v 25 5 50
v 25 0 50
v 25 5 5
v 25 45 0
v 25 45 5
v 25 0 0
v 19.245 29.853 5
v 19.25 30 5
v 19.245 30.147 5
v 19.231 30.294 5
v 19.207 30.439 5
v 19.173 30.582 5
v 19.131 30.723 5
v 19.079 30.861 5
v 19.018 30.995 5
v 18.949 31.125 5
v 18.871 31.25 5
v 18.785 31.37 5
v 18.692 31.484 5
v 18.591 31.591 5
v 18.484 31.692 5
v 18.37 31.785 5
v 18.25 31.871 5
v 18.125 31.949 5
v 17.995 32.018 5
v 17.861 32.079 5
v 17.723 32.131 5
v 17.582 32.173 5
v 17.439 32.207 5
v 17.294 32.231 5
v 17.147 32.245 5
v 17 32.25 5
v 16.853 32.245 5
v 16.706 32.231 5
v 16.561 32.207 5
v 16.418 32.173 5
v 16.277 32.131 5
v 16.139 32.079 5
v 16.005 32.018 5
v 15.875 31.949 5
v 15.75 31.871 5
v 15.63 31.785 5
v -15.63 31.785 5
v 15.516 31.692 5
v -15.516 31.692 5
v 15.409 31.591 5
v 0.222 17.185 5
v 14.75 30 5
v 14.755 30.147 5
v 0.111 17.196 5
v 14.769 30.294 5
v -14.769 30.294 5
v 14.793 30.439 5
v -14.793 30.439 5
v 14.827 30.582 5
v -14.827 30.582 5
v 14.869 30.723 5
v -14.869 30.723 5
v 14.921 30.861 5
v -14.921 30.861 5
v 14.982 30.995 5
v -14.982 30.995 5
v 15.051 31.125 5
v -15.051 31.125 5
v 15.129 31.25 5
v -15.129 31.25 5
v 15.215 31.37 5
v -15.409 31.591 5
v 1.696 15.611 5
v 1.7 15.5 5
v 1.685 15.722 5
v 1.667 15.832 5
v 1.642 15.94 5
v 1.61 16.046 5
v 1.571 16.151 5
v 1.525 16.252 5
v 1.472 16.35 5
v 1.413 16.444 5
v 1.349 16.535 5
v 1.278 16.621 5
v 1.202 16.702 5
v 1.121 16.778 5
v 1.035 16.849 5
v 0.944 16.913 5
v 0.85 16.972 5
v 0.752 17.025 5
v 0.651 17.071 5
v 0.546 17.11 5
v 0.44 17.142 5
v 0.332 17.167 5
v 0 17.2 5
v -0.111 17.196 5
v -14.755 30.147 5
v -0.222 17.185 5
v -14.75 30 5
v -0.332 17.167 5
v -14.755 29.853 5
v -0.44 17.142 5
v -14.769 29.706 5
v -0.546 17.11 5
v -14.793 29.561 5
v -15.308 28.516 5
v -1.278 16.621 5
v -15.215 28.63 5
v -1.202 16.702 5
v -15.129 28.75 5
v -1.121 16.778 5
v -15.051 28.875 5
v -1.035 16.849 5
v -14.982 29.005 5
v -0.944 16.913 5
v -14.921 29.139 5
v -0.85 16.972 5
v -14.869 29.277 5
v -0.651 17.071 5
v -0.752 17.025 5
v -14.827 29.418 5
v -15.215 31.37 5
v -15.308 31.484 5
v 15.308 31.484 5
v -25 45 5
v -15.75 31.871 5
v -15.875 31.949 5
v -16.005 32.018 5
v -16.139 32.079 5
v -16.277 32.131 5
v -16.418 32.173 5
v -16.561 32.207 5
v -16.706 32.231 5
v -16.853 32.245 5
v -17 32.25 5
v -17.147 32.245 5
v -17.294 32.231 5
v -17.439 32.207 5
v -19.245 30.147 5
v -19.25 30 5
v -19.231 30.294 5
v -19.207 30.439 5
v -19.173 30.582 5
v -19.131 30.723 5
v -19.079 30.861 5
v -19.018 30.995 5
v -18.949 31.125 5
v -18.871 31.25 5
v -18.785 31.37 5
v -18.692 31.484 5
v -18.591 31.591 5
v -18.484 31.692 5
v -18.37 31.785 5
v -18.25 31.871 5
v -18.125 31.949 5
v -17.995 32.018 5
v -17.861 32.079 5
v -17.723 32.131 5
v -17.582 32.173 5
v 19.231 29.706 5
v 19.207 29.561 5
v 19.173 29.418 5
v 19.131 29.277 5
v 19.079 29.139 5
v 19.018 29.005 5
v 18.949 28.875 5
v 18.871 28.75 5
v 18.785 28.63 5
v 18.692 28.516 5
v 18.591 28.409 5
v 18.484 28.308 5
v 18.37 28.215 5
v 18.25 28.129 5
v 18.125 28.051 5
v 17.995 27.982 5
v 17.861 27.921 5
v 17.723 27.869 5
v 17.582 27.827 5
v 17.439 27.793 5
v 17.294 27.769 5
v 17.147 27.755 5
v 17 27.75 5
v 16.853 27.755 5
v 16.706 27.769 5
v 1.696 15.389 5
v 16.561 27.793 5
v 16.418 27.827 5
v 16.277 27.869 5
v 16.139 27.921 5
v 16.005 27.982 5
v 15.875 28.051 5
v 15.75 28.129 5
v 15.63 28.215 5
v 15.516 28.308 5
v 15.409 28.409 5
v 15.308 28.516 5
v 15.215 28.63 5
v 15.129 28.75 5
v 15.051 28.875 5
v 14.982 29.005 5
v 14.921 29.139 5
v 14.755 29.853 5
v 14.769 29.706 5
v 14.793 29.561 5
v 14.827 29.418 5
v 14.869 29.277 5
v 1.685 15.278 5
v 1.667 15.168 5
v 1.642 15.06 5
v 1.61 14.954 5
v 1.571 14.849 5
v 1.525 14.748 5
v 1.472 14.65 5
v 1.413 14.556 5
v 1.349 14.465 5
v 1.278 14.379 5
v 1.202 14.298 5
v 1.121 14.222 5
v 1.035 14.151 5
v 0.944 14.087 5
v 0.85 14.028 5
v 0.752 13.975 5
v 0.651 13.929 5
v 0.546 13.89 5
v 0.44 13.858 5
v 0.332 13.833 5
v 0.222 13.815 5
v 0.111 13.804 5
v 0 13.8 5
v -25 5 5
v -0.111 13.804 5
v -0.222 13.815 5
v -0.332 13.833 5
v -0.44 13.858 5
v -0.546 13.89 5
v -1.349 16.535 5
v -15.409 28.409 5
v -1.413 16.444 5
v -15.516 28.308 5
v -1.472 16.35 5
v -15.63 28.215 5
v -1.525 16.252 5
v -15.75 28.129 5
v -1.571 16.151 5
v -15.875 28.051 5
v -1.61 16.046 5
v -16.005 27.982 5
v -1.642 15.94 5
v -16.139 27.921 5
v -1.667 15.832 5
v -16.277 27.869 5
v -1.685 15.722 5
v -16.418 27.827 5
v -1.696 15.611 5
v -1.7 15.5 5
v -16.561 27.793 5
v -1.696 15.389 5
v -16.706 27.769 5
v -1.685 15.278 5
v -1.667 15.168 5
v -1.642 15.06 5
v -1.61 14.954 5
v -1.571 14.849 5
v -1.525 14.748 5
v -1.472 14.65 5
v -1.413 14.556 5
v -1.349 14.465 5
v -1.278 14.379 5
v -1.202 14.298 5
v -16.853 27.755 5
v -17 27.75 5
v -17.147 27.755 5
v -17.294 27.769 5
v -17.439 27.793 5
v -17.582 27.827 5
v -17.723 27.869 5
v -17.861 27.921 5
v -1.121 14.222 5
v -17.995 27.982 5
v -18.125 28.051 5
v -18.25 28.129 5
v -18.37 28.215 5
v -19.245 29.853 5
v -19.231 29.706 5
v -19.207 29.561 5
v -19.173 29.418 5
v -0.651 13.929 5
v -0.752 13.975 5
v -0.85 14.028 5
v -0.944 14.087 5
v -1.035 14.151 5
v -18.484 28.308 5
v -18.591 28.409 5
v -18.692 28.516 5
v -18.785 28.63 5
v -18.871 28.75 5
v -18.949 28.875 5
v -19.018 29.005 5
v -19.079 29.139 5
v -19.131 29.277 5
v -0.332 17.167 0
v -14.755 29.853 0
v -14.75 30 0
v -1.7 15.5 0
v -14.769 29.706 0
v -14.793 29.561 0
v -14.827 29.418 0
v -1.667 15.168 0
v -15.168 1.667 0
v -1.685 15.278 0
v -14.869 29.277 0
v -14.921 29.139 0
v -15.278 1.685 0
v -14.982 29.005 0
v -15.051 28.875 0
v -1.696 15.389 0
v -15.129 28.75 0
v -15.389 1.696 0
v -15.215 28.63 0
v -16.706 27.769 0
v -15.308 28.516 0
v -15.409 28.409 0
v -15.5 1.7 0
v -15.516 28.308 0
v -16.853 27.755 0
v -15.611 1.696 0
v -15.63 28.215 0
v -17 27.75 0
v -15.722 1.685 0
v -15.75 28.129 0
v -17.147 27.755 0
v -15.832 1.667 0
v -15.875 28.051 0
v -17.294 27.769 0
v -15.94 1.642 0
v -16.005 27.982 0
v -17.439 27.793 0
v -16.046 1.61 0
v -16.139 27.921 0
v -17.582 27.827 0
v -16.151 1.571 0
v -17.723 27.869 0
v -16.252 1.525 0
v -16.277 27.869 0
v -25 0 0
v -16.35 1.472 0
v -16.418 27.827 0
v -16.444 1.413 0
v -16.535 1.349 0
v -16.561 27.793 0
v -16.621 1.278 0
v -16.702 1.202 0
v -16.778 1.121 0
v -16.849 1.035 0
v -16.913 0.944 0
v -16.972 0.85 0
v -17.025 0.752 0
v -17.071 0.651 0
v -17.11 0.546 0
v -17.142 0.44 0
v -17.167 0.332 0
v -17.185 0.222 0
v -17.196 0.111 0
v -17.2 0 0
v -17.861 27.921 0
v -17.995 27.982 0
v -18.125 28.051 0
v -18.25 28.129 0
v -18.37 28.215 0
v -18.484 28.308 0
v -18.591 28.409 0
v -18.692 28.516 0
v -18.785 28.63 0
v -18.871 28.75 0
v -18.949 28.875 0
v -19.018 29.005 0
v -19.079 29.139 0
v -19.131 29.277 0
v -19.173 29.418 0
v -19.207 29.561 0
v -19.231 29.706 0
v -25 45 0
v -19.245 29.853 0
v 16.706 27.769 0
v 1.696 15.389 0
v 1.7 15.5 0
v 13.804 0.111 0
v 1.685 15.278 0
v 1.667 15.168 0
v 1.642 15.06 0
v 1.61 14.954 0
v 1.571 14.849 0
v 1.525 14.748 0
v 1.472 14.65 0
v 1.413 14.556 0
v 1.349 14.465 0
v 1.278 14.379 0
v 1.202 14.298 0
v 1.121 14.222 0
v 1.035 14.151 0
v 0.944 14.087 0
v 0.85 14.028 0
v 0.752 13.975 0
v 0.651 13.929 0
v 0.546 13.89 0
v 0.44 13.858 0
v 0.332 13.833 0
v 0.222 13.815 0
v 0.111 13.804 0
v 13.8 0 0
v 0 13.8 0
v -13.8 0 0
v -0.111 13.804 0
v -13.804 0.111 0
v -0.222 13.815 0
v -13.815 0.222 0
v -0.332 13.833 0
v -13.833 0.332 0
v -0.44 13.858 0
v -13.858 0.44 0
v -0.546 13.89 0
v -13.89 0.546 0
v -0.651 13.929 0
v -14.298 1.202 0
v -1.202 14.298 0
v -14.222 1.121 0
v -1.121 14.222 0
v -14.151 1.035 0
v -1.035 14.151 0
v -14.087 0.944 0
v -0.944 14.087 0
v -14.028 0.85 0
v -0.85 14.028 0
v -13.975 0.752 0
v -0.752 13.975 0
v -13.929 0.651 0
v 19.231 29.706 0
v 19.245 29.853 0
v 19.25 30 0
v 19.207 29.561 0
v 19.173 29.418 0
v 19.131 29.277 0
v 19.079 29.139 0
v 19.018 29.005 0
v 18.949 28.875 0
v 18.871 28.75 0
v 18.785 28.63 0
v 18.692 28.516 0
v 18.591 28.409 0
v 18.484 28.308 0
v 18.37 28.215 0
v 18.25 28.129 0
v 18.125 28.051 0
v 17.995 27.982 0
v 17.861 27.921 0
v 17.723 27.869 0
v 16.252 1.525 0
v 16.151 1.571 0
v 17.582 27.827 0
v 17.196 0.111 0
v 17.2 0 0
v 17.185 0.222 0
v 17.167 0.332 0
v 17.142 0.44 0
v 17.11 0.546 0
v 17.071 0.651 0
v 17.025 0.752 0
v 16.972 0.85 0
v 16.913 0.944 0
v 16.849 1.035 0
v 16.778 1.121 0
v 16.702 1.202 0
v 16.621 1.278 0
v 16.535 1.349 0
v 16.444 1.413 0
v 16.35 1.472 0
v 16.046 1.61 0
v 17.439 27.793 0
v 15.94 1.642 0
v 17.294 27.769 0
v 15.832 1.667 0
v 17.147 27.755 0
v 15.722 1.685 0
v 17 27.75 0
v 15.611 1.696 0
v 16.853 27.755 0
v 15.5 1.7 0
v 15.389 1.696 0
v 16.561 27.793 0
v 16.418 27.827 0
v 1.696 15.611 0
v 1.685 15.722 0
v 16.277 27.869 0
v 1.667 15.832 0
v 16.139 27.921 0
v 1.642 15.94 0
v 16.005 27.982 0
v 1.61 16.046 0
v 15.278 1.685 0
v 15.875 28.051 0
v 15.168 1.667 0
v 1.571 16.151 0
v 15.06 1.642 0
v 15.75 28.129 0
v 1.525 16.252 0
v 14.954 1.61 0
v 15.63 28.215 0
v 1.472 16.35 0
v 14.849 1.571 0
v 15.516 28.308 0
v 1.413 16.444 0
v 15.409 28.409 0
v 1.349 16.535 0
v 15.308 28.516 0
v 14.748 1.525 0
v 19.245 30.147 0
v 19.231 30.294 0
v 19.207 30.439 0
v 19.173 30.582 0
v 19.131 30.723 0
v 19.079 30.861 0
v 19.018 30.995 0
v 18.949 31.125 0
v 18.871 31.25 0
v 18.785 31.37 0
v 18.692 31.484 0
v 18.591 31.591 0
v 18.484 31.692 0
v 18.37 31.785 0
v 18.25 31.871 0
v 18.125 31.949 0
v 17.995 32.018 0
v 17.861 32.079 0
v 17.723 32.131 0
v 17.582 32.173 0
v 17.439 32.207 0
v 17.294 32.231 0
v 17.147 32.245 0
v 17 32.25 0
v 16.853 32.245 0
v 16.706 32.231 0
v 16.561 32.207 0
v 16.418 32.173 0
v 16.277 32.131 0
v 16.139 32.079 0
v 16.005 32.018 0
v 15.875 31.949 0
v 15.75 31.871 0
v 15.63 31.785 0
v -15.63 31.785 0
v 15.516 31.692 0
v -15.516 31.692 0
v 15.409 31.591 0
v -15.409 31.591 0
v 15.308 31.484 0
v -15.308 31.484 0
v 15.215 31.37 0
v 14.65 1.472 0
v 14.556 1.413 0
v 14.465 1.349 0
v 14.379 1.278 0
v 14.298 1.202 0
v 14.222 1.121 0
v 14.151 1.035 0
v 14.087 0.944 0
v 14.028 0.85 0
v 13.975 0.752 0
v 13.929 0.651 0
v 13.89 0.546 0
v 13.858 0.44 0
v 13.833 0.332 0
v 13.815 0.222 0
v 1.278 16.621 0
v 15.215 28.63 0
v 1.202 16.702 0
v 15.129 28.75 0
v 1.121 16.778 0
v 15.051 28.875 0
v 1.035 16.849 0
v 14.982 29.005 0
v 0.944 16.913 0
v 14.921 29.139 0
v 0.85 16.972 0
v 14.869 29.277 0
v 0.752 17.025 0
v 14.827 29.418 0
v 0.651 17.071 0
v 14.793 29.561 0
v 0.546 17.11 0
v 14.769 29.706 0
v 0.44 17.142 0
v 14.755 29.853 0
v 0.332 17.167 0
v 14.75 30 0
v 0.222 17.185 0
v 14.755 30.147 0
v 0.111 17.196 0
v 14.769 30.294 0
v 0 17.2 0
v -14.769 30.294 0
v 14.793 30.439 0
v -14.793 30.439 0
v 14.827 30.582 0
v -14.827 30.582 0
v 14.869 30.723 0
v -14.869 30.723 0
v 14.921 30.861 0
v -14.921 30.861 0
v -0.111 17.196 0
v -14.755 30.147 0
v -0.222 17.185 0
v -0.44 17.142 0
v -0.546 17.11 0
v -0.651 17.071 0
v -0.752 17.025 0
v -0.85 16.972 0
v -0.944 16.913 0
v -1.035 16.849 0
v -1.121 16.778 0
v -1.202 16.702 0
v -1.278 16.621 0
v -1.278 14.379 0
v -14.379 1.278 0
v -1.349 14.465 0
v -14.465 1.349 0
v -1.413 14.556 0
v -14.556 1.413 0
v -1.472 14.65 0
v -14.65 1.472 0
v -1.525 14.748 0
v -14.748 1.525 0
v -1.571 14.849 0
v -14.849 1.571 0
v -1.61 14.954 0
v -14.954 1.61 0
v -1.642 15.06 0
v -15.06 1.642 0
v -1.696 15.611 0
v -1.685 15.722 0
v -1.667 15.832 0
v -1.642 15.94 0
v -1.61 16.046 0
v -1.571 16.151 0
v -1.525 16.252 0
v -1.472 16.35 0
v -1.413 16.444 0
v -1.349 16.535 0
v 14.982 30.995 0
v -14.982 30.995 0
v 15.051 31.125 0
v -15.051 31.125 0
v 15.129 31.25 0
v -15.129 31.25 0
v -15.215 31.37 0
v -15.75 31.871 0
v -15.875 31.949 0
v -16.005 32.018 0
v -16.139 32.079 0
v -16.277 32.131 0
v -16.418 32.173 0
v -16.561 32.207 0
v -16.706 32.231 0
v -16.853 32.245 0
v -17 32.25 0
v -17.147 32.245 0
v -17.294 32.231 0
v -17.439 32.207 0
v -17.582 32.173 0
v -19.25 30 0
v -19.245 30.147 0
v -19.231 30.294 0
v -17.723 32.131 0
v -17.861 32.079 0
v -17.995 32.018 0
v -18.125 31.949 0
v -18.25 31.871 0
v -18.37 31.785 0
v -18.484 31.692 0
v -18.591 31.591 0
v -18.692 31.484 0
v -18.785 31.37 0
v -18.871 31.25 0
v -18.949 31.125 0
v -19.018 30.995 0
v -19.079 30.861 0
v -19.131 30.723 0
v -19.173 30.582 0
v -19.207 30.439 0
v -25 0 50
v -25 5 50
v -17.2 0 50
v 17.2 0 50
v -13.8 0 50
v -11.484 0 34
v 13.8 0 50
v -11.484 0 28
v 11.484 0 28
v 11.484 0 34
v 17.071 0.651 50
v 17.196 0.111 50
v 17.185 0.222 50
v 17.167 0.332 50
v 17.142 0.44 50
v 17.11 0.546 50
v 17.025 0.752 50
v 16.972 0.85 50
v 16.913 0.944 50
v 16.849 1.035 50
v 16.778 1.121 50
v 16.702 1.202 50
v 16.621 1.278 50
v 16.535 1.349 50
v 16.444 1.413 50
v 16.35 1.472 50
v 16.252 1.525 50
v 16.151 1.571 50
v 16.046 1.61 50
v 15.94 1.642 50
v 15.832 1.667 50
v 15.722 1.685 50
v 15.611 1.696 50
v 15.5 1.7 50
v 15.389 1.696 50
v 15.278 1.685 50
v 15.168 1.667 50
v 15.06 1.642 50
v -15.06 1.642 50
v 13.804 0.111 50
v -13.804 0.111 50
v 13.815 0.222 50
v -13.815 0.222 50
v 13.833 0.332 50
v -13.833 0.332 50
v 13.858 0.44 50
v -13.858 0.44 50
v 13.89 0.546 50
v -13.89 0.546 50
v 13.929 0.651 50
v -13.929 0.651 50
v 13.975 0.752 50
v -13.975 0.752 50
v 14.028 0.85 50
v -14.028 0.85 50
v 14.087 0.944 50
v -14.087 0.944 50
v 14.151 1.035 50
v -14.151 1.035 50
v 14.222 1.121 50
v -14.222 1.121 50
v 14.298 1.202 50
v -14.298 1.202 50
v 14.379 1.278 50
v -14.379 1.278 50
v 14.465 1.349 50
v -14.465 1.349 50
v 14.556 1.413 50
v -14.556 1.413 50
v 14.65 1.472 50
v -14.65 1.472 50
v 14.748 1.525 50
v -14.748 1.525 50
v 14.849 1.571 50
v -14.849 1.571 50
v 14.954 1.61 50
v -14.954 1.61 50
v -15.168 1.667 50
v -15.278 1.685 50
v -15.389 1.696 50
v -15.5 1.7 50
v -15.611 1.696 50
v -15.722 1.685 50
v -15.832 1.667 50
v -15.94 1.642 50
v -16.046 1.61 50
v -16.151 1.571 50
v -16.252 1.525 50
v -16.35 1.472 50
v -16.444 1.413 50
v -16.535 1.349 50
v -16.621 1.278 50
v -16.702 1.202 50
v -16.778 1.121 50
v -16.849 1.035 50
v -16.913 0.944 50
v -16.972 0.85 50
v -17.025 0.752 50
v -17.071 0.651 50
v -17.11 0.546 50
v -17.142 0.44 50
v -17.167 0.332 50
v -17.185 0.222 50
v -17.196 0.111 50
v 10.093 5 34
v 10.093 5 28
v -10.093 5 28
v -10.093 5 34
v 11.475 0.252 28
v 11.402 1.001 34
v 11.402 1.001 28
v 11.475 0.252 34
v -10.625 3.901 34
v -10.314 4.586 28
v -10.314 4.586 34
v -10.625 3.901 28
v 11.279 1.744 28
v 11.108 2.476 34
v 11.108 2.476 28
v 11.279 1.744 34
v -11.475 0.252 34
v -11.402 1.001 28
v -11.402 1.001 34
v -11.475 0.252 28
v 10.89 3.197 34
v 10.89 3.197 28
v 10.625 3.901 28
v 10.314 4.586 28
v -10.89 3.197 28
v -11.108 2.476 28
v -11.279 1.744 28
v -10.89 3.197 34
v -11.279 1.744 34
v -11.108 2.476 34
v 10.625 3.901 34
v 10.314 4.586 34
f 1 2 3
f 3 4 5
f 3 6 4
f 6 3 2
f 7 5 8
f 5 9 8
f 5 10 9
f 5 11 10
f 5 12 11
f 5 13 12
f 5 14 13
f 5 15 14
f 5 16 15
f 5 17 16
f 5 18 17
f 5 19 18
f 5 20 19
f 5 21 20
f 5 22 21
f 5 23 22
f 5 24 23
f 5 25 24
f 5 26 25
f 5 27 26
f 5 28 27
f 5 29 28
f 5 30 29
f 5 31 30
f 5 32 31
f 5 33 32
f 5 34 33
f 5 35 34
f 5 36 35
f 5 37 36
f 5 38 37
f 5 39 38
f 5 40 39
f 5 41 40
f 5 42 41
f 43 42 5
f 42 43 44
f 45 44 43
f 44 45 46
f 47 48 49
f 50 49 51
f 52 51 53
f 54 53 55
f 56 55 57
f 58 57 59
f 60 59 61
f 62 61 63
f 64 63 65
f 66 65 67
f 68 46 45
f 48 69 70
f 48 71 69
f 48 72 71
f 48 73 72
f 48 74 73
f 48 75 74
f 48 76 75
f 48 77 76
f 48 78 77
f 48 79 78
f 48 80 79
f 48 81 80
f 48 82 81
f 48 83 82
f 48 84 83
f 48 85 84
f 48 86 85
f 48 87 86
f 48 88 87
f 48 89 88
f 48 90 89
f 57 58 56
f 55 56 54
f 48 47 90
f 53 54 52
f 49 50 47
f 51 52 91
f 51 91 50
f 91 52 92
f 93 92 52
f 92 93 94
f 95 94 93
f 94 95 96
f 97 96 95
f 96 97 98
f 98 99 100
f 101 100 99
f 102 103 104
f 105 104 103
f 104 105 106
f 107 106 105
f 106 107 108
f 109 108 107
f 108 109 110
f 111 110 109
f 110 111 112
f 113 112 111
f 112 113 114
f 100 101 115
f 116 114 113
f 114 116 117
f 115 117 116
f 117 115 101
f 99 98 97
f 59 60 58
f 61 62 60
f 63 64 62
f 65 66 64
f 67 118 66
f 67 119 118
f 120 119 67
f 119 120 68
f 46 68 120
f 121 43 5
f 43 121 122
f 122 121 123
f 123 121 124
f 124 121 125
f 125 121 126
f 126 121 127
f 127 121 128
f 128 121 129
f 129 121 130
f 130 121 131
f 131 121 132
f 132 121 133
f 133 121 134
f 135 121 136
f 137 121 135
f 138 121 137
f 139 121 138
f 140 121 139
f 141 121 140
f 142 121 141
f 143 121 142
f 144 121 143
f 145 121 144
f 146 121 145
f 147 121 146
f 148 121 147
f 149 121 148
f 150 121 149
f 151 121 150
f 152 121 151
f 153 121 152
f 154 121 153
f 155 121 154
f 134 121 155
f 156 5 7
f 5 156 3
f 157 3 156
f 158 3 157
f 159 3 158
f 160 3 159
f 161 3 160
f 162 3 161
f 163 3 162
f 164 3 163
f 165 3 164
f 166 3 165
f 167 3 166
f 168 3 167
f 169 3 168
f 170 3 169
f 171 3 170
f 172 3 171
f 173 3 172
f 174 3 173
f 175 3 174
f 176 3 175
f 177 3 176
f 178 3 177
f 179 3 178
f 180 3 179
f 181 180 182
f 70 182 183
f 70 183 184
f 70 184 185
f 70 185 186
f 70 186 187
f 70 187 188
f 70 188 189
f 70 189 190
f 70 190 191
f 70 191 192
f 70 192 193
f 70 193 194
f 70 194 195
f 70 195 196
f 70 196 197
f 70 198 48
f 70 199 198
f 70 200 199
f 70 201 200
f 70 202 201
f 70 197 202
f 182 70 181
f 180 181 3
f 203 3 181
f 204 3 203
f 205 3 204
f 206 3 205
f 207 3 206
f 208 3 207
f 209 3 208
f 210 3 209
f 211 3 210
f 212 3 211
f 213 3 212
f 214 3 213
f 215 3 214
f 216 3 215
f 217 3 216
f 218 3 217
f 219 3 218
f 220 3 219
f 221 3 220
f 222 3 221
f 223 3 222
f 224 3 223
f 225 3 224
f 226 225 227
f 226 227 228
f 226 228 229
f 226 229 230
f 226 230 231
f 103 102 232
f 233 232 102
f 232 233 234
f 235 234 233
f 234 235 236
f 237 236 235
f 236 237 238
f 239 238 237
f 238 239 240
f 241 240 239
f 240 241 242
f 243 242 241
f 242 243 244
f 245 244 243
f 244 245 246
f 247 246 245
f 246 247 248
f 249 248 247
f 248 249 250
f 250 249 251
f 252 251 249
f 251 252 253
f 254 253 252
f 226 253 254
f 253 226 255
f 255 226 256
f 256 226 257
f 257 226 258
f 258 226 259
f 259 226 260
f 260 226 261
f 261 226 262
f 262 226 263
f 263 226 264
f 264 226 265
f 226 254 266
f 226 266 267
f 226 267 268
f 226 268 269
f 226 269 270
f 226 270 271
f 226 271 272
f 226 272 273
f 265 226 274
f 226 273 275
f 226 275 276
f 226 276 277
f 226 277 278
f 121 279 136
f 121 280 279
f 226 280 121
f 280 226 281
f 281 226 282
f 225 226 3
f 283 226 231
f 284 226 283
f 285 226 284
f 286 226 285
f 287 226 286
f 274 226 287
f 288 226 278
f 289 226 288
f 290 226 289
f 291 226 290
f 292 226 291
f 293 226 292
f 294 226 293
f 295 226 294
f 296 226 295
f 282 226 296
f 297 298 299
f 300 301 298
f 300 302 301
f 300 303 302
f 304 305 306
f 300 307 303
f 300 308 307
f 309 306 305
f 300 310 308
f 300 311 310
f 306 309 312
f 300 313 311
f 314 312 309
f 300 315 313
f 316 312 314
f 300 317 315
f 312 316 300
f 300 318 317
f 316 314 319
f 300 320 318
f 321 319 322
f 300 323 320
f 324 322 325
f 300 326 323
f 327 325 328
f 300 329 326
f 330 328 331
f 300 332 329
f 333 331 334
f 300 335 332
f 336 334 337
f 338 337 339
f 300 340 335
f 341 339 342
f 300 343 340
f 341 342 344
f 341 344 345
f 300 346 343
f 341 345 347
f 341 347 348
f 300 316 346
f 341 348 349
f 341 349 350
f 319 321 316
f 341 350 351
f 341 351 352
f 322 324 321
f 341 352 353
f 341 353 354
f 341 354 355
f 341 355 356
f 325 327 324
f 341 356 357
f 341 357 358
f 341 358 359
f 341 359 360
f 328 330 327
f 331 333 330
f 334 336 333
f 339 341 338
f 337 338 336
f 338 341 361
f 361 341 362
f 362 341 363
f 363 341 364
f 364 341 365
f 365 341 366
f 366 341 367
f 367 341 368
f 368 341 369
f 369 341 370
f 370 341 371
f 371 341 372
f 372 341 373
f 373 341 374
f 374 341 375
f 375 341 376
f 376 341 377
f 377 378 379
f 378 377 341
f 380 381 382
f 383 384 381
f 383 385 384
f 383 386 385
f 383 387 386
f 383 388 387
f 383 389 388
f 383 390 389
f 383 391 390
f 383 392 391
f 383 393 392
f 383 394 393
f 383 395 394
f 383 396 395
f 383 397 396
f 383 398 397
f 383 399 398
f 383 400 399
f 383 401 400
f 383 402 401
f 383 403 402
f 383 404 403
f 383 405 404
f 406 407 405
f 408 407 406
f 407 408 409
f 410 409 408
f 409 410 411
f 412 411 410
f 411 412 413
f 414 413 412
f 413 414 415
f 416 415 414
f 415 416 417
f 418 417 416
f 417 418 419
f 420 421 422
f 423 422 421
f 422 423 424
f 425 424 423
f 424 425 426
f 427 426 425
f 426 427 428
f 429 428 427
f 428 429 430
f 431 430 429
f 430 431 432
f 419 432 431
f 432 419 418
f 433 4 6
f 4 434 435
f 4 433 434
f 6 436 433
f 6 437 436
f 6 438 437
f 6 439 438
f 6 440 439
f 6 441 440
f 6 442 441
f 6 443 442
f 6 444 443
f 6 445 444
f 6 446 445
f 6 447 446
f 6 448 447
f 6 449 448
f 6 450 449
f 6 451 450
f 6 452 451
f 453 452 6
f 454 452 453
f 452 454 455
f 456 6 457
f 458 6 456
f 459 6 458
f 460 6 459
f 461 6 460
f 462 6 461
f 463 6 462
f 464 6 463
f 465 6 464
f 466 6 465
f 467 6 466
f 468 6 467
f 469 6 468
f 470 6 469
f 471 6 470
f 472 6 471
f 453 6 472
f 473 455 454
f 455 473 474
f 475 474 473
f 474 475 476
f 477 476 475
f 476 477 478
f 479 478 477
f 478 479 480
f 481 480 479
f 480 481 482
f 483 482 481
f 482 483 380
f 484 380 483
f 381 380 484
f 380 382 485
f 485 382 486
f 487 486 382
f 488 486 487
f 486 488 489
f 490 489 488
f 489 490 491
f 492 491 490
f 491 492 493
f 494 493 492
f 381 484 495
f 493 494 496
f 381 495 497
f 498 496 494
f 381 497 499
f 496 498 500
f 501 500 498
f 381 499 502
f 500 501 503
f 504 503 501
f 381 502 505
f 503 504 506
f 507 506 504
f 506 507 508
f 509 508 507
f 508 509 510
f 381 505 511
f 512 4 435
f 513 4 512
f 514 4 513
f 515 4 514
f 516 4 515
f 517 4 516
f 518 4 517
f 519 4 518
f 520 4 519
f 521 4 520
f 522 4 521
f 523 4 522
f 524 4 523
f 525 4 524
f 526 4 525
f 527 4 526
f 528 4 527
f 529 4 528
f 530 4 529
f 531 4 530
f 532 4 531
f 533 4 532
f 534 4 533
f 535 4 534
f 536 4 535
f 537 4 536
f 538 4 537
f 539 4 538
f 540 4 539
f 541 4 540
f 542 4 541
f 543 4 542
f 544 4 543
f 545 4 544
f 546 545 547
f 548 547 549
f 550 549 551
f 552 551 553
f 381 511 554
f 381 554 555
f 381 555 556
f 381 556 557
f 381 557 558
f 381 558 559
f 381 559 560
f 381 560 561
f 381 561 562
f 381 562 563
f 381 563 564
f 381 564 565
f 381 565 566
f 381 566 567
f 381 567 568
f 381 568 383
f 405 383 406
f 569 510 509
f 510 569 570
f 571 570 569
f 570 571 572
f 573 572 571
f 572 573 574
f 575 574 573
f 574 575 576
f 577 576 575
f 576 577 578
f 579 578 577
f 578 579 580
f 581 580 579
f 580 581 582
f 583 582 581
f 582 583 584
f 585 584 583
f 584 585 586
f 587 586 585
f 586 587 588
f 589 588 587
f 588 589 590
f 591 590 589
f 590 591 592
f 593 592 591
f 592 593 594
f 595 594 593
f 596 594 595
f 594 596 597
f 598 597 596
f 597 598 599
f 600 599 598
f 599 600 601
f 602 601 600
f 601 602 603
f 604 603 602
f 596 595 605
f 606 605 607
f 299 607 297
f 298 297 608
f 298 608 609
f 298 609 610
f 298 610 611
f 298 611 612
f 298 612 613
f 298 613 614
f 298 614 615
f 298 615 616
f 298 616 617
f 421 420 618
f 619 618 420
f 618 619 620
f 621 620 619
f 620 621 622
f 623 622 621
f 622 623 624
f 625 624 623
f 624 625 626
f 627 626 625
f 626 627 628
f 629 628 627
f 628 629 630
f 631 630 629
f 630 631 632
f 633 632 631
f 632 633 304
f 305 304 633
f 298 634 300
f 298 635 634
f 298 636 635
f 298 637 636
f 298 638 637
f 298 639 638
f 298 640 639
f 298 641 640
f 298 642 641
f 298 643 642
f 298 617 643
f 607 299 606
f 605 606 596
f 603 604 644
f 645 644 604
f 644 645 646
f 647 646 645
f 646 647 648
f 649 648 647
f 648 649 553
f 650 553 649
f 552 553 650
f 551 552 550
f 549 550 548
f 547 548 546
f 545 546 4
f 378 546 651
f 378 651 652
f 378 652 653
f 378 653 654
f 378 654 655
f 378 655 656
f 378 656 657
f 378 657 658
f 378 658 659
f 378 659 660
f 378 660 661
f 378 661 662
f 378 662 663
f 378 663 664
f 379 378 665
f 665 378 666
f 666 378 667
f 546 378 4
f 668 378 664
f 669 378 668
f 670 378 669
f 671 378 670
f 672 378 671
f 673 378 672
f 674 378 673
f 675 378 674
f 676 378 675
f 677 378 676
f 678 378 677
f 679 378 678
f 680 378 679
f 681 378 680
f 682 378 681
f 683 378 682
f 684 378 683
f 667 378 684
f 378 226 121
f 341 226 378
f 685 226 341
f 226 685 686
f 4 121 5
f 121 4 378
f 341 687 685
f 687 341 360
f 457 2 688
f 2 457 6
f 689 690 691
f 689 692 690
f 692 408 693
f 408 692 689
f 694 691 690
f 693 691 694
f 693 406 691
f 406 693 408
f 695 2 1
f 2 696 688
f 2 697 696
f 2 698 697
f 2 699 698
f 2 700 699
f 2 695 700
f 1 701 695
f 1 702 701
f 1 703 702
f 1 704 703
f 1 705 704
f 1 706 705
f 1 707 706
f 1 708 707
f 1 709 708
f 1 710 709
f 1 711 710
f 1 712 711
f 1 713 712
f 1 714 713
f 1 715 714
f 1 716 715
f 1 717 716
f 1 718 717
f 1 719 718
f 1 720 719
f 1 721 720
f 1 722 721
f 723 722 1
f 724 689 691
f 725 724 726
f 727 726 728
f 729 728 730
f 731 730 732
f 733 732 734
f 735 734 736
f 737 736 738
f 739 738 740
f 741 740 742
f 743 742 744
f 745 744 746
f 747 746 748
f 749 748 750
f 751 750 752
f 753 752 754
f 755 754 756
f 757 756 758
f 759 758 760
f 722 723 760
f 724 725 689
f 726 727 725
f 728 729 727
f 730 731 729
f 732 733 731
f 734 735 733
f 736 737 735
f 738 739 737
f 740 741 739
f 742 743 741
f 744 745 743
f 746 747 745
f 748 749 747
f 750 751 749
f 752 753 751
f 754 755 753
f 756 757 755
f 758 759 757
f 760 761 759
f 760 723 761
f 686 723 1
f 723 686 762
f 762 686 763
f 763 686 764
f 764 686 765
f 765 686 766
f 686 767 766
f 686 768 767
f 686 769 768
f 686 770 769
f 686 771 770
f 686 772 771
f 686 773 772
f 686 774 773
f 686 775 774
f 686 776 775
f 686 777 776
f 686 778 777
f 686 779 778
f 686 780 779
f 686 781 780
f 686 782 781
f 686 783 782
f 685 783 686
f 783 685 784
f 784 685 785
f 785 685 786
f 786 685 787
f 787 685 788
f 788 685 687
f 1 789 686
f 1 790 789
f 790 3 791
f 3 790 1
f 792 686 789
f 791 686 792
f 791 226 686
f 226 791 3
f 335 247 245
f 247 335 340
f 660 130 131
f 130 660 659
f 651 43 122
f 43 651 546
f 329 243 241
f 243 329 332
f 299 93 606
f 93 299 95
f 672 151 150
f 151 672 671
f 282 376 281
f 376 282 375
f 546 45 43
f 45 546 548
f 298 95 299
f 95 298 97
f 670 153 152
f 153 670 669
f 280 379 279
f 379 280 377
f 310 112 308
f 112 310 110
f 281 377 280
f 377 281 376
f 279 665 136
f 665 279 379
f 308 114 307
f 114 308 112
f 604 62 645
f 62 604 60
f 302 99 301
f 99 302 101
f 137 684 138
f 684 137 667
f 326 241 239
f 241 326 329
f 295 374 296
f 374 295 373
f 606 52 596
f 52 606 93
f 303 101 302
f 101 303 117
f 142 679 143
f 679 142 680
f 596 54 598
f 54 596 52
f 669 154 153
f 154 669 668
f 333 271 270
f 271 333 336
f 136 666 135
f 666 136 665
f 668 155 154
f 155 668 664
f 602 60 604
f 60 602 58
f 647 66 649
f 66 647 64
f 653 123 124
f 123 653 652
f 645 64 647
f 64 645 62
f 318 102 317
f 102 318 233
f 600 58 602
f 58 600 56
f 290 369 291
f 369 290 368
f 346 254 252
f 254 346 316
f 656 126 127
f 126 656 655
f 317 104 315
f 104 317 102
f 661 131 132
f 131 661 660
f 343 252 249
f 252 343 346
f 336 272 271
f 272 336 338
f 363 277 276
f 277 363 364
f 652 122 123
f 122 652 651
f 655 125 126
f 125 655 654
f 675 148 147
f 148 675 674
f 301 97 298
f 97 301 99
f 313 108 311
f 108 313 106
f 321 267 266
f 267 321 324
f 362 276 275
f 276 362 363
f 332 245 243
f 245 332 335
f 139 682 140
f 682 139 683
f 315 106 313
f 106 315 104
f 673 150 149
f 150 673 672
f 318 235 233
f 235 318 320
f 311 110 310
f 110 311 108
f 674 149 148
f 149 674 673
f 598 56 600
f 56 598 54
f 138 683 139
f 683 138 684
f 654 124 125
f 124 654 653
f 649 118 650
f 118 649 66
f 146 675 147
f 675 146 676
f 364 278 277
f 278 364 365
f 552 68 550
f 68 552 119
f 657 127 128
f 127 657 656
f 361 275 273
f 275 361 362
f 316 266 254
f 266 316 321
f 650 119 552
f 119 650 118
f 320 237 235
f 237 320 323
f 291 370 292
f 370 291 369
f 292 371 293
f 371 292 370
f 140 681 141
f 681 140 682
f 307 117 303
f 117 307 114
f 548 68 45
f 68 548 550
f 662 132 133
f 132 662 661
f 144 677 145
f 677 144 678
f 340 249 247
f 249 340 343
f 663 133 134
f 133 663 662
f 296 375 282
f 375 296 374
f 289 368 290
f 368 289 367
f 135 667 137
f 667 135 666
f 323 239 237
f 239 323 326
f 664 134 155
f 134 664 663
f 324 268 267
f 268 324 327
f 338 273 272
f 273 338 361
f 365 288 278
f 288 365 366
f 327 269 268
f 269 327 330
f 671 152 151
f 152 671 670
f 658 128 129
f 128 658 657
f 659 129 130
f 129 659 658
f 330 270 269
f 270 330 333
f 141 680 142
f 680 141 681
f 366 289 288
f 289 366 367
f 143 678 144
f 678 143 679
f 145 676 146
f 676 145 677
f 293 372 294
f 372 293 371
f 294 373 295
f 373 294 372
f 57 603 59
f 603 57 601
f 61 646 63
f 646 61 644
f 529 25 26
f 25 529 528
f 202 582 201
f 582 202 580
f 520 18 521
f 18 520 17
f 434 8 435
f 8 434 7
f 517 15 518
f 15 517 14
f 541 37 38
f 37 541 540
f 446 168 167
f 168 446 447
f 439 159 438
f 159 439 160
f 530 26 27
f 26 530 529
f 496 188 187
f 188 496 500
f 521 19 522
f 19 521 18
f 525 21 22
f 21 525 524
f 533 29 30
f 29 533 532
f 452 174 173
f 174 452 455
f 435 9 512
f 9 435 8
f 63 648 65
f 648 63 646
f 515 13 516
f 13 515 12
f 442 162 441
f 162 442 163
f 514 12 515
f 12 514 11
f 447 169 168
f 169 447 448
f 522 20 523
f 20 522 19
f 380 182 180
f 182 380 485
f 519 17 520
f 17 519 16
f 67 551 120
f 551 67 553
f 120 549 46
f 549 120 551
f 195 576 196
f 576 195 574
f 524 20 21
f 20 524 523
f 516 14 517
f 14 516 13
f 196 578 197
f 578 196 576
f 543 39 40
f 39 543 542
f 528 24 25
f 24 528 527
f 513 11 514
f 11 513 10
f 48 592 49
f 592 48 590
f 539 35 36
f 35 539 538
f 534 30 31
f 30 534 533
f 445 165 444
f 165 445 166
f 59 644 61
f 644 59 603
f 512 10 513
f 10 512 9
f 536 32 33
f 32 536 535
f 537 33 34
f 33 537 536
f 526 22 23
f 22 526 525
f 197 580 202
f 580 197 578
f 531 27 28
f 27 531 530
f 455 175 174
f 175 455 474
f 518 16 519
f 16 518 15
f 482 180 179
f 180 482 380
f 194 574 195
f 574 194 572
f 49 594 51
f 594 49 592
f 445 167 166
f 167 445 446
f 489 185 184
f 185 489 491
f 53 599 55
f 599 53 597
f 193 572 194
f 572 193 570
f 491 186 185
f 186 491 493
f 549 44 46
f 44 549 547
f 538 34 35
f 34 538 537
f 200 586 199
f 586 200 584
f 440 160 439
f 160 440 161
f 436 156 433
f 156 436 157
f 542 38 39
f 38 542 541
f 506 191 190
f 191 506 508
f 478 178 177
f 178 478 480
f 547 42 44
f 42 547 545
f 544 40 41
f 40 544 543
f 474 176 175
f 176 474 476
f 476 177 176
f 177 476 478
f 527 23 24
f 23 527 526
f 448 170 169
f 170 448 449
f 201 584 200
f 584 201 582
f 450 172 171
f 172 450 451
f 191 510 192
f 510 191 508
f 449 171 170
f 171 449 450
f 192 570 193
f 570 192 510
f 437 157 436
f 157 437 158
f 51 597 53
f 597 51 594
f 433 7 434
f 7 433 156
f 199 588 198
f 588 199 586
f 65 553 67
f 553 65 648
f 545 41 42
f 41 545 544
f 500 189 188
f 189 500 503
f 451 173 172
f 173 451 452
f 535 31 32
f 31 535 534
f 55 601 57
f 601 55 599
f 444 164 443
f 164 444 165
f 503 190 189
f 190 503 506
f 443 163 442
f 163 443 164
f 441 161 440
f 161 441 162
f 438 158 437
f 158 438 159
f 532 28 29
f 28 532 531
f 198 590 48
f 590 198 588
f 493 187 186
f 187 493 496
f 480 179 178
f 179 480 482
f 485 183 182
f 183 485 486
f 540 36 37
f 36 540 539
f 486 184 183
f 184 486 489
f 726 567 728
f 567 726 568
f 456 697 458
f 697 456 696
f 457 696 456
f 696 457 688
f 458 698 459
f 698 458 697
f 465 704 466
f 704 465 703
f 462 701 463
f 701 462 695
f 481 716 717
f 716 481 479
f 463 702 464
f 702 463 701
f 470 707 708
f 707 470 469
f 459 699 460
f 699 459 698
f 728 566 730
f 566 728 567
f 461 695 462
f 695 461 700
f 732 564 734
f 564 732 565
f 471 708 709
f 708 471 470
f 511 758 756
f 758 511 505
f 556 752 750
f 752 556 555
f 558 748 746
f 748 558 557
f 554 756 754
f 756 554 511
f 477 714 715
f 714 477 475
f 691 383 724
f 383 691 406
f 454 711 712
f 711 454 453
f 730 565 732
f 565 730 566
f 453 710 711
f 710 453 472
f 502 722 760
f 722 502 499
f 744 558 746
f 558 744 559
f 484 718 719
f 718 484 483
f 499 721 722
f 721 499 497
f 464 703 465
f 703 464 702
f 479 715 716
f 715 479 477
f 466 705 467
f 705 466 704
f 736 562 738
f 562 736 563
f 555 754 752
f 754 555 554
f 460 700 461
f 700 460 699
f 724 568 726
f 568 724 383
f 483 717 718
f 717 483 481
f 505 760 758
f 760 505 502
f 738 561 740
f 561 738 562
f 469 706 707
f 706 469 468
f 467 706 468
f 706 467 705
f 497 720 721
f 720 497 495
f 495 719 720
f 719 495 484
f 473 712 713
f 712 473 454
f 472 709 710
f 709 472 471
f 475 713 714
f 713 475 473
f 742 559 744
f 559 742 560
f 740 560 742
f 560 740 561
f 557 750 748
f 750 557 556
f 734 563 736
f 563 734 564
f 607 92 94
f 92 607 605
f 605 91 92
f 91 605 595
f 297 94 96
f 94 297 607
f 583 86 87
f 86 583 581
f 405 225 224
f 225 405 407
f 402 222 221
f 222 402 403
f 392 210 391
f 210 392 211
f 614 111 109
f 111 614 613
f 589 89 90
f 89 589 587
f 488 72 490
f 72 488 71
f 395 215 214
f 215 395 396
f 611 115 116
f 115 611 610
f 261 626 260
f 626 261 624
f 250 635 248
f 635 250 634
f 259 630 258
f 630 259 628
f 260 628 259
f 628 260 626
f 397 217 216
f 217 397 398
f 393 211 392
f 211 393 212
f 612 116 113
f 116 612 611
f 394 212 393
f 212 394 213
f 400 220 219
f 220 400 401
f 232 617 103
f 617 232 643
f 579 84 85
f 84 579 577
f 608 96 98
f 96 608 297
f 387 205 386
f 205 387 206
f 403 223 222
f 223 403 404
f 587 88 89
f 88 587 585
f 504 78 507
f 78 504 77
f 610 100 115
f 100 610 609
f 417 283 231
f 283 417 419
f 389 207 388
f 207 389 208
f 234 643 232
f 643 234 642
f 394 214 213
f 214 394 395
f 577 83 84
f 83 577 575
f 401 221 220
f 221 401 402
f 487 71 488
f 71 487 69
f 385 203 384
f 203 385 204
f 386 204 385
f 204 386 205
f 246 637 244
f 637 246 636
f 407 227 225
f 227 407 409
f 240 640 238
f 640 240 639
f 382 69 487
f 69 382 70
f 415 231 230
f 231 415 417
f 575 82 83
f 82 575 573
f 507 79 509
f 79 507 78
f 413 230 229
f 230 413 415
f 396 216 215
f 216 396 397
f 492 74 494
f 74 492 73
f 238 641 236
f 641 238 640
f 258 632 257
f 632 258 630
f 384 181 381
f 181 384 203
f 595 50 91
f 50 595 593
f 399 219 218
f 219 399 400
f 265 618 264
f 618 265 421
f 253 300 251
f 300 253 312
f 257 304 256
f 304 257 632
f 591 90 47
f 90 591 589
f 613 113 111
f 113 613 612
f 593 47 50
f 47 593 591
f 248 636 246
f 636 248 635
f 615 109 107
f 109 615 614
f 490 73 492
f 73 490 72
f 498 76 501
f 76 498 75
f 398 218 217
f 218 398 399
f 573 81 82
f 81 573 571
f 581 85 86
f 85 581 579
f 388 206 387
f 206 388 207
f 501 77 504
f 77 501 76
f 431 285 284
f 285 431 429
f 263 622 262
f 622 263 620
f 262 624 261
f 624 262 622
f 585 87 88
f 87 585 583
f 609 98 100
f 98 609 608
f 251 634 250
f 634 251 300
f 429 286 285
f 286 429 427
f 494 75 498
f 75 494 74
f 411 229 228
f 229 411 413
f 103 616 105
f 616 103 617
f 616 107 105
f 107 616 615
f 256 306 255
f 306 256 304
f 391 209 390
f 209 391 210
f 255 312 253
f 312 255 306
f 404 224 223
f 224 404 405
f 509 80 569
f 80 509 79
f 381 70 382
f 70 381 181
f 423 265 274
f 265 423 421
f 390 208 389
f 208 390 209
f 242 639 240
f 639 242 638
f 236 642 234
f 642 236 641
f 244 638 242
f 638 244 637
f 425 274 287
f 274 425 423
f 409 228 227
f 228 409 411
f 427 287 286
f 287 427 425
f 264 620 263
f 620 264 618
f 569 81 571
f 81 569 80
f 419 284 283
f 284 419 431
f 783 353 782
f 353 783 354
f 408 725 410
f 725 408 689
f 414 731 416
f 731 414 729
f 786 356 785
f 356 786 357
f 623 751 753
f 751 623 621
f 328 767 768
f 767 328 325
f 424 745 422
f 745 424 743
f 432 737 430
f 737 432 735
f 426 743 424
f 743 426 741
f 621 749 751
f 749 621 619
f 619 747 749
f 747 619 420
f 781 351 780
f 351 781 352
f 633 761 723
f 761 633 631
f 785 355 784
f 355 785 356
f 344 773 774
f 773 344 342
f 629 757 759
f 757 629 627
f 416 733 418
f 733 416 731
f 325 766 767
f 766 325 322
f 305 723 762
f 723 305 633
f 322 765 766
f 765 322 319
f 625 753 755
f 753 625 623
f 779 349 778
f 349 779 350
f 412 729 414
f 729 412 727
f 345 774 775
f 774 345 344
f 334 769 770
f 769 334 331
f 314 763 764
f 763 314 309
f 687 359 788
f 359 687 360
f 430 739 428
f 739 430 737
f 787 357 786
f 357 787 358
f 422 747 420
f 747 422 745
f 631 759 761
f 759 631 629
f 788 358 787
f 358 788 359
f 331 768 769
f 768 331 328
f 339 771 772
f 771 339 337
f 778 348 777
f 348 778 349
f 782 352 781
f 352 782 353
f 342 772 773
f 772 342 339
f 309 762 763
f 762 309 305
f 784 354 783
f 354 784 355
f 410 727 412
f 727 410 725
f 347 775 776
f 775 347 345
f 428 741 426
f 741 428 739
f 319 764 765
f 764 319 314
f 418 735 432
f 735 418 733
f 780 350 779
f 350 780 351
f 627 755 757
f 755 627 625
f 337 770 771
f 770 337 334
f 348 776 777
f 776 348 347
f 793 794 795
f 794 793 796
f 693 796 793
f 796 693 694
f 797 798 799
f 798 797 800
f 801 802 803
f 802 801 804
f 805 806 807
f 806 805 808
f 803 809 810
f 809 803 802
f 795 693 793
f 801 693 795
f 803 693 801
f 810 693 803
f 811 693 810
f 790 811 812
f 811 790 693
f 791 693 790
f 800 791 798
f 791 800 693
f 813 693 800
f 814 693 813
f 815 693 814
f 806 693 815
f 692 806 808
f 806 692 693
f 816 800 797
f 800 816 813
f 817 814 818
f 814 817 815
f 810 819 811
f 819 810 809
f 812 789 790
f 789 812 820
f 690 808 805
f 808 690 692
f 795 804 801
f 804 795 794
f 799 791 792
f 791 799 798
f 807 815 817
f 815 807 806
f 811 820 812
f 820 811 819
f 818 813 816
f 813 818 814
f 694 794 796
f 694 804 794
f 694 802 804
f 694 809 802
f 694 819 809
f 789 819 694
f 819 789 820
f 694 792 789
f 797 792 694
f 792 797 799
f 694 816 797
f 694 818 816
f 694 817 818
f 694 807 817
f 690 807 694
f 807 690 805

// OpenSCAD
// L-shaped mounting bracket for a NEMA 17 stepper motor (e.g. syringe pump)
// Print orientation: base plate on the bed (z = 0), motor plate builds upward.

// ---------------- Parameters ----------------
base_x0      = -25;    // base plate, x start
base_x1      = 25;     // base plate, x end
base_y0      = 0;      // base plate, y start
base_y1      = 45;     // base plate, y end
base_z0      = 0;      // base plate, z start
base_z1      = 5;      // base plate, z end

motor_x0     = -25;    // motor plate, x start
motor_x1     = 25;     // motor plate, x end
motor_y0     = 0;      // motor plate, y start
motor_y1     = 5;      // motor plate, y end (sits on back edge of base)
motor_z0     = 0;      // motor plate, z start
motor_z1     = 50;     // motor plate, z end

hole_m4_x1   = -17;    // M4 through-hole in base, x
hole_m4_y1   = 30;     // M4 through-hole in base, y
hole_m4_x2   = 17;     // M4 through-hole in base, x
hole_m4_y2   = 30;     // M4 through-hole in base, y
hole_m4_d    = 4.5;    // M4 hole diameter

boss_d       = 23;     // motor centring boss hole diameter
boss_x       = 0;      // boss hole centre, x
boss_z       = 28;     // boss hole centre, z
screw_d      = 3.4;    // M3 screw hole diameter
screw_pat    = 31;     // square pattern side length for screw holes

gusset_t     = 5;      // gusset thickness (X)
gusset_leg   = 20;     // right-triangle leg length (Y and Z)
gusset_x0    = -25;    // left gusset, x start
gusset_x1    = -20;    // left gusset, x end
gusset_y0    = 5;      // gusset triangle, y start (at base)
gusset_z0    = 5;      // gusset triangle, z start (at base)

eps          = 0.5;    // cutter overshoot past faces

$fn = 96;

// ---------------- Model ----------------
difference() {
    union() {
        // Base plate
        translate([base_x0, base_y0, base_z0])
            cube([base_x1 - base_x0, base_y1 - base_y0, base_z1 - base_z0]);

        // Vertical motor plate
        translate([motor_x0, motor_y0, motor_z0])
            cube([motor_x1 - motor_x0, motor_y1 - motor_y0, motor_z1 - motor_z0]);

        // Left triangular gusset (flush with left edge)
        translate([gusset_x0, gusset_y0, gusset_z0])
            rotate([90, 0, 0])
                linear_extrude(height = gusset_t)
                    polygon([[0, 0], [gusset_leg, 0], [0, gusset_leg]]);

        // Right triangular gusset (flush with right edge)
        translate([gusset_x1, gusset_y0, gusset_z0])
            rotate([90, 0, 0])
                linear_extrude(height = gusset_t)
                    polygon([[0, 0], [gusset_leg, 0], [0, gusset_leg]]);
    }

    // Base plate through-holes (M4)
    for (i = [1, 2])
        translate([i == 1 ? hole_m4_x1 : hole_m4_x2, hole_m4_y1, -eps])
            cylinder(d = hole_m4_d, h = base_z1 - base_z0 + 2 * eps);

    // Motor boss hole (through along Y)
    translate([boss_x, motor_y0 - eps, boss_z])
        cylinder(d = boss_d, h = motor_y1 - motor_y0 + 2 * eps);

    // M3 screw holes on a square pattern, centred on the boss hole
    for (a = [0, 90, 180, 270])
        rotate([0, 0, a])
            translate([screw_pat / 2, 0, 0])
                cylinder(d = screw_d, h = motor_z1 - motor_z0 + eps);
}
